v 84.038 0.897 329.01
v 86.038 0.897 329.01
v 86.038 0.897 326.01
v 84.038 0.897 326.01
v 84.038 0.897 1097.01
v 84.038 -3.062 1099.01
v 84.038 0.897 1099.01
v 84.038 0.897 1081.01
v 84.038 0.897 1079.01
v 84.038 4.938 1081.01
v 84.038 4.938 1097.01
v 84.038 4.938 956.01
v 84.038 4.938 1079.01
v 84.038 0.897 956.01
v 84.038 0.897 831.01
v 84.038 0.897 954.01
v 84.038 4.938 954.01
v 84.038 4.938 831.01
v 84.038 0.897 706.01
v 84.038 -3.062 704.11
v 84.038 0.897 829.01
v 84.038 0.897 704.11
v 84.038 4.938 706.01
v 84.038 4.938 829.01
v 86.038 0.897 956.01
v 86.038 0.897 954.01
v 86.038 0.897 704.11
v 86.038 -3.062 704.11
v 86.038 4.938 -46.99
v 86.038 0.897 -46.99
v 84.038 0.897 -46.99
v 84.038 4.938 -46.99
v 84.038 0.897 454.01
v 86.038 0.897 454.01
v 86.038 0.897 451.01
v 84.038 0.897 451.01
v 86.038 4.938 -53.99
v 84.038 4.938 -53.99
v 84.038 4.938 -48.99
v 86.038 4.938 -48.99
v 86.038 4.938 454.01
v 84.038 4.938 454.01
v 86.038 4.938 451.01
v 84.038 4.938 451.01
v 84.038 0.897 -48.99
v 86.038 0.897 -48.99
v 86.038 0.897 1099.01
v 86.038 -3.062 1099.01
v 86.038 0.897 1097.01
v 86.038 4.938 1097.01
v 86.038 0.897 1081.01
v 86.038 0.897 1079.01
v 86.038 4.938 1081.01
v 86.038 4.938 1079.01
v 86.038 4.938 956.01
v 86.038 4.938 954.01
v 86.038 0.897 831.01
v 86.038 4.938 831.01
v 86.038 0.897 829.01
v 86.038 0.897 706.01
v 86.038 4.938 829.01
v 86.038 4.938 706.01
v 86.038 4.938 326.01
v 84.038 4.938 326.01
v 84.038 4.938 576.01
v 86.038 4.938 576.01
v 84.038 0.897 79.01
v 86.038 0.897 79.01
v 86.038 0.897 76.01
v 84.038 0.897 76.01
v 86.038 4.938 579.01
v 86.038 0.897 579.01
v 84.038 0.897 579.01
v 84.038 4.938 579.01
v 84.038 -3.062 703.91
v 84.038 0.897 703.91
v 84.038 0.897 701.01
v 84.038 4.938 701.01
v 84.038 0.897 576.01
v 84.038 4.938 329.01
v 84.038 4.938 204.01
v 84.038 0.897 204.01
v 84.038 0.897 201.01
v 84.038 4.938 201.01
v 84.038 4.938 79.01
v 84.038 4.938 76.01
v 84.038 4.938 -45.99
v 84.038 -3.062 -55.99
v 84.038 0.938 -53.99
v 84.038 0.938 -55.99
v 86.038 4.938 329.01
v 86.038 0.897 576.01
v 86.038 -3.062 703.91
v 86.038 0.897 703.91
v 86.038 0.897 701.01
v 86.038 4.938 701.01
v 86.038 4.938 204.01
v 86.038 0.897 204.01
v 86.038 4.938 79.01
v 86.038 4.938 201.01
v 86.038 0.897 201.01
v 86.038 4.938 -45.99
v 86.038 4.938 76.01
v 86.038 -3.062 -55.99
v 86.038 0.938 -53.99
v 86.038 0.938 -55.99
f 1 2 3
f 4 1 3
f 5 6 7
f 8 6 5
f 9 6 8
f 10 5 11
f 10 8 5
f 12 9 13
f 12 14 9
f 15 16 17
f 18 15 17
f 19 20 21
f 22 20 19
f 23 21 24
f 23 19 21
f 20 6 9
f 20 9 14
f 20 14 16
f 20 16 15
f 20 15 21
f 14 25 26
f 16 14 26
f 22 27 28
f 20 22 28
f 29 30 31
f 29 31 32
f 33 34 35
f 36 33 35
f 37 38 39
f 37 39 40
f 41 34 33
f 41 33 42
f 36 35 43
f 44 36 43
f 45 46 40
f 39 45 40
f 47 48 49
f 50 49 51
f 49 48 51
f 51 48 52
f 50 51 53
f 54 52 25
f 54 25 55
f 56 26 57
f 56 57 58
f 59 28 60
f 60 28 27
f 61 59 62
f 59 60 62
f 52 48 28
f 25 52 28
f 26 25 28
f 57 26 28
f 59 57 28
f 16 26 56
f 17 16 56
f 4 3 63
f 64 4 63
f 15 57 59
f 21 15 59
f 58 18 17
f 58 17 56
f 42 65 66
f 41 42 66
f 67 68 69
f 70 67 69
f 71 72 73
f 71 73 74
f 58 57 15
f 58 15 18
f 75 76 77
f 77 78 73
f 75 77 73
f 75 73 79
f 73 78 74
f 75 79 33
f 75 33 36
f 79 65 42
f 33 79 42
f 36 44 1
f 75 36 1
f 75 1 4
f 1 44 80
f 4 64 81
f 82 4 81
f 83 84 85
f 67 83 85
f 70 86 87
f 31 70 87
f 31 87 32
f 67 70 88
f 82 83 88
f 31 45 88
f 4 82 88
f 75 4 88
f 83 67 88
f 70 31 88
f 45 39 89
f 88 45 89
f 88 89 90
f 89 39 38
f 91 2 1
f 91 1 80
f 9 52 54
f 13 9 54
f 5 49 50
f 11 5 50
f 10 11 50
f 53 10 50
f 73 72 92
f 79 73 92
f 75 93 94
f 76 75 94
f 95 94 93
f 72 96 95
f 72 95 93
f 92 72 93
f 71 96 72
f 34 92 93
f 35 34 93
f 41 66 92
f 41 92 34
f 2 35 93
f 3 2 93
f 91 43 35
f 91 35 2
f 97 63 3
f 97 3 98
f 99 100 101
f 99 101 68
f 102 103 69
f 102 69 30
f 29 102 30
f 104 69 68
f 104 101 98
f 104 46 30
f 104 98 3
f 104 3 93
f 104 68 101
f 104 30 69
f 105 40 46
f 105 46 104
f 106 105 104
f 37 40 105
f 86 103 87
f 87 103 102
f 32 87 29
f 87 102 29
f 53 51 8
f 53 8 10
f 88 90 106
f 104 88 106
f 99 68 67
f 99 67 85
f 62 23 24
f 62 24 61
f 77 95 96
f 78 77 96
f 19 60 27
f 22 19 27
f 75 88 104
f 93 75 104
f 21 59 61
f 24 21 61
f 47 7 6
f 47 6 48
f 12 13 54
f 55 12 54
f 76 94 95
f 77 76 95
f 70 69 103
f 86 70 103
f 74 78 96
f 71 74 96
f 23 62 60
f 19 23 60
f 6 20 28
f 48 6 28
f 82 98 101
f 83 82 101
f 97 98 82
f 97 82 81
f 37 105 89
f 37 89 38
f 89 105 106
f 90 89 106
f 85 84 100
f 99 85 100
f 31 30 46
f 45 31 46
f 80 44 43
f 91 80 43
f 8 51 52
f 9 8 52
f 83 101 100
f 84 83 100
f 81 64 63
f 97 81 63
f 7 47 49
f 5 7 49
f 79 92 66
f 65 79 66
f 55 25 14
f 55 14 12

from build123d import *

# Parameters (mm, degrees)
SKETCH_1_W          = 2
SKETCH_1_H          = 8
EXTRUDE_1_DEPTH     = 1155
SKETCH_2_W          = 2
SKETCH_2_H          = 4.041229023
SKETCH_2_W_2        = 3
SKETCH_2_H_2        = 4
CUT_EXTRUDE_1_DEPTH = 1100.022913046
SKETCH_3_W          = 1
SKETCH_3_H          = 4.041229023
EXTRUDE_2_DEPTH     = 2


with BuildPart() as part:
    # 草图1 → 凸台-拉伸1 (new body)
    with BuildSketch(Plane.XY.offset(-55.99)):
        with Locations((85.037619105, 0.937944836)):
            Rectangle(SKETCH_1_W, SKETCH_1_H)
    extrude(amount=EXTRUDE_1_DEPTH)

    # 草图2 → 切除-拉伸1 (cut, through all)
    with BuildSketch(Plane(origin=(86.037619105, 0, 0), x_dir=(0, 0, -1), z_dir=(1, 0, 0))):
        with Locations((-1098.01, 2.917330325)):
            Rectangle(SKETCH_2_W, SKETCH_2_H)
        with Locations((-1080.01, 2.917330325)):
            Rectangle(SKETCH_2_W, SKETCH_2_H)
        with Locations((-955.01, 2.917330325)):
            Rectangle(SKETCH_2_W, SKETCH_2_H)
        with Locations((-830.01, 2.917330325)):
            Rectangle(SKETCH_2_W, SKETCH_2_H)
        Polygon((-706.01, 0.896715813), (-704.11, 0.896715813), (-704.01, 0.896715813), (-704.01, 4.937944836), (-706.01, 4.937944836), align=None)
        Polygon((-704.01, 0.896715813), (-703.91, 0.896715813), (-701.01, 0.896715813), (-701.01, 4.937944836), (-704.01, 4.937944836), align=None)
        with Locations((-577.51, 2.917330325)):
            Rectangle(SKETCH_2_W_2, SKETCH_2_H)
        with Locations((-452.51, 2.917330325)):
            Rectangle(SKETCH_2_W_2, SKETCH_2_H)
        with Locations((-327.51, 2.917330325)):
            Rectangle(SKETCH_2_W_2, SKETCH_2_H)
        with Locations((-202.51, 2.917330325)):
            Rectangle(SKETCH_2_W_2, SKETCH_2_H)
        with Locations((-77.51, 2.917330325)):
            Rectangle(SKETCH_2_W_2, SKETCH_2_H)
        with Locations((47.49, 2.917330325)):
            Rectangle(SKETCH_2_W_2, SKETCH_2_H)
        with Locations((54.99, 2.937944836)):
            Rectangle(SKETCH_2_W, SKETCH_2_H_2)
        Polygon((-704.11, -3.062055164), (-703.91, -3.062055164), (-703.91, 0.896715813), (-704.01, 0.896715813), (-704.11, 0.896715813), align=None)
    extrude(amount=-CUT_EXTRUDE_1_DEPTH, mode=Mode.SUBTRACT)


with BuildPart() as cut_extrude_1_piece_1:
    # of the separate pieces the step leaves, piece 1, a body of its own (cut_extrude_1_pieces)
    add(part.part.solids().sort_by_distance((86.037619105, -3.062055164, -55.99))[0])

    # 草图3 → 凸台-拉伸2 (add)
    with BuildSketch(Plane(origin=(86.037619105, 0, 0), x_dir=(0, 0, -1), z_dir=(1, 0, 0))):
        with Locations((46.49, 2.917330325)):
            Rectangle(SKETCH_3_W, SKETCH_3_H)
    extrude(amount=-EXTRUDE_2_DEPTH)


with BuildPart() as cut_extrude_1_piece_2:
    # of the separate pieces the step leaves, piece 2, a body of its own (cut_extrude_1_pieces)
    add(part.part.solids().sort_by_distance((86.037619105, -3.062055164, 704.11))[0])


solid = Compound([cut_extrude_1_piece_1.part, cut_extrude_1_piece_2.part])
